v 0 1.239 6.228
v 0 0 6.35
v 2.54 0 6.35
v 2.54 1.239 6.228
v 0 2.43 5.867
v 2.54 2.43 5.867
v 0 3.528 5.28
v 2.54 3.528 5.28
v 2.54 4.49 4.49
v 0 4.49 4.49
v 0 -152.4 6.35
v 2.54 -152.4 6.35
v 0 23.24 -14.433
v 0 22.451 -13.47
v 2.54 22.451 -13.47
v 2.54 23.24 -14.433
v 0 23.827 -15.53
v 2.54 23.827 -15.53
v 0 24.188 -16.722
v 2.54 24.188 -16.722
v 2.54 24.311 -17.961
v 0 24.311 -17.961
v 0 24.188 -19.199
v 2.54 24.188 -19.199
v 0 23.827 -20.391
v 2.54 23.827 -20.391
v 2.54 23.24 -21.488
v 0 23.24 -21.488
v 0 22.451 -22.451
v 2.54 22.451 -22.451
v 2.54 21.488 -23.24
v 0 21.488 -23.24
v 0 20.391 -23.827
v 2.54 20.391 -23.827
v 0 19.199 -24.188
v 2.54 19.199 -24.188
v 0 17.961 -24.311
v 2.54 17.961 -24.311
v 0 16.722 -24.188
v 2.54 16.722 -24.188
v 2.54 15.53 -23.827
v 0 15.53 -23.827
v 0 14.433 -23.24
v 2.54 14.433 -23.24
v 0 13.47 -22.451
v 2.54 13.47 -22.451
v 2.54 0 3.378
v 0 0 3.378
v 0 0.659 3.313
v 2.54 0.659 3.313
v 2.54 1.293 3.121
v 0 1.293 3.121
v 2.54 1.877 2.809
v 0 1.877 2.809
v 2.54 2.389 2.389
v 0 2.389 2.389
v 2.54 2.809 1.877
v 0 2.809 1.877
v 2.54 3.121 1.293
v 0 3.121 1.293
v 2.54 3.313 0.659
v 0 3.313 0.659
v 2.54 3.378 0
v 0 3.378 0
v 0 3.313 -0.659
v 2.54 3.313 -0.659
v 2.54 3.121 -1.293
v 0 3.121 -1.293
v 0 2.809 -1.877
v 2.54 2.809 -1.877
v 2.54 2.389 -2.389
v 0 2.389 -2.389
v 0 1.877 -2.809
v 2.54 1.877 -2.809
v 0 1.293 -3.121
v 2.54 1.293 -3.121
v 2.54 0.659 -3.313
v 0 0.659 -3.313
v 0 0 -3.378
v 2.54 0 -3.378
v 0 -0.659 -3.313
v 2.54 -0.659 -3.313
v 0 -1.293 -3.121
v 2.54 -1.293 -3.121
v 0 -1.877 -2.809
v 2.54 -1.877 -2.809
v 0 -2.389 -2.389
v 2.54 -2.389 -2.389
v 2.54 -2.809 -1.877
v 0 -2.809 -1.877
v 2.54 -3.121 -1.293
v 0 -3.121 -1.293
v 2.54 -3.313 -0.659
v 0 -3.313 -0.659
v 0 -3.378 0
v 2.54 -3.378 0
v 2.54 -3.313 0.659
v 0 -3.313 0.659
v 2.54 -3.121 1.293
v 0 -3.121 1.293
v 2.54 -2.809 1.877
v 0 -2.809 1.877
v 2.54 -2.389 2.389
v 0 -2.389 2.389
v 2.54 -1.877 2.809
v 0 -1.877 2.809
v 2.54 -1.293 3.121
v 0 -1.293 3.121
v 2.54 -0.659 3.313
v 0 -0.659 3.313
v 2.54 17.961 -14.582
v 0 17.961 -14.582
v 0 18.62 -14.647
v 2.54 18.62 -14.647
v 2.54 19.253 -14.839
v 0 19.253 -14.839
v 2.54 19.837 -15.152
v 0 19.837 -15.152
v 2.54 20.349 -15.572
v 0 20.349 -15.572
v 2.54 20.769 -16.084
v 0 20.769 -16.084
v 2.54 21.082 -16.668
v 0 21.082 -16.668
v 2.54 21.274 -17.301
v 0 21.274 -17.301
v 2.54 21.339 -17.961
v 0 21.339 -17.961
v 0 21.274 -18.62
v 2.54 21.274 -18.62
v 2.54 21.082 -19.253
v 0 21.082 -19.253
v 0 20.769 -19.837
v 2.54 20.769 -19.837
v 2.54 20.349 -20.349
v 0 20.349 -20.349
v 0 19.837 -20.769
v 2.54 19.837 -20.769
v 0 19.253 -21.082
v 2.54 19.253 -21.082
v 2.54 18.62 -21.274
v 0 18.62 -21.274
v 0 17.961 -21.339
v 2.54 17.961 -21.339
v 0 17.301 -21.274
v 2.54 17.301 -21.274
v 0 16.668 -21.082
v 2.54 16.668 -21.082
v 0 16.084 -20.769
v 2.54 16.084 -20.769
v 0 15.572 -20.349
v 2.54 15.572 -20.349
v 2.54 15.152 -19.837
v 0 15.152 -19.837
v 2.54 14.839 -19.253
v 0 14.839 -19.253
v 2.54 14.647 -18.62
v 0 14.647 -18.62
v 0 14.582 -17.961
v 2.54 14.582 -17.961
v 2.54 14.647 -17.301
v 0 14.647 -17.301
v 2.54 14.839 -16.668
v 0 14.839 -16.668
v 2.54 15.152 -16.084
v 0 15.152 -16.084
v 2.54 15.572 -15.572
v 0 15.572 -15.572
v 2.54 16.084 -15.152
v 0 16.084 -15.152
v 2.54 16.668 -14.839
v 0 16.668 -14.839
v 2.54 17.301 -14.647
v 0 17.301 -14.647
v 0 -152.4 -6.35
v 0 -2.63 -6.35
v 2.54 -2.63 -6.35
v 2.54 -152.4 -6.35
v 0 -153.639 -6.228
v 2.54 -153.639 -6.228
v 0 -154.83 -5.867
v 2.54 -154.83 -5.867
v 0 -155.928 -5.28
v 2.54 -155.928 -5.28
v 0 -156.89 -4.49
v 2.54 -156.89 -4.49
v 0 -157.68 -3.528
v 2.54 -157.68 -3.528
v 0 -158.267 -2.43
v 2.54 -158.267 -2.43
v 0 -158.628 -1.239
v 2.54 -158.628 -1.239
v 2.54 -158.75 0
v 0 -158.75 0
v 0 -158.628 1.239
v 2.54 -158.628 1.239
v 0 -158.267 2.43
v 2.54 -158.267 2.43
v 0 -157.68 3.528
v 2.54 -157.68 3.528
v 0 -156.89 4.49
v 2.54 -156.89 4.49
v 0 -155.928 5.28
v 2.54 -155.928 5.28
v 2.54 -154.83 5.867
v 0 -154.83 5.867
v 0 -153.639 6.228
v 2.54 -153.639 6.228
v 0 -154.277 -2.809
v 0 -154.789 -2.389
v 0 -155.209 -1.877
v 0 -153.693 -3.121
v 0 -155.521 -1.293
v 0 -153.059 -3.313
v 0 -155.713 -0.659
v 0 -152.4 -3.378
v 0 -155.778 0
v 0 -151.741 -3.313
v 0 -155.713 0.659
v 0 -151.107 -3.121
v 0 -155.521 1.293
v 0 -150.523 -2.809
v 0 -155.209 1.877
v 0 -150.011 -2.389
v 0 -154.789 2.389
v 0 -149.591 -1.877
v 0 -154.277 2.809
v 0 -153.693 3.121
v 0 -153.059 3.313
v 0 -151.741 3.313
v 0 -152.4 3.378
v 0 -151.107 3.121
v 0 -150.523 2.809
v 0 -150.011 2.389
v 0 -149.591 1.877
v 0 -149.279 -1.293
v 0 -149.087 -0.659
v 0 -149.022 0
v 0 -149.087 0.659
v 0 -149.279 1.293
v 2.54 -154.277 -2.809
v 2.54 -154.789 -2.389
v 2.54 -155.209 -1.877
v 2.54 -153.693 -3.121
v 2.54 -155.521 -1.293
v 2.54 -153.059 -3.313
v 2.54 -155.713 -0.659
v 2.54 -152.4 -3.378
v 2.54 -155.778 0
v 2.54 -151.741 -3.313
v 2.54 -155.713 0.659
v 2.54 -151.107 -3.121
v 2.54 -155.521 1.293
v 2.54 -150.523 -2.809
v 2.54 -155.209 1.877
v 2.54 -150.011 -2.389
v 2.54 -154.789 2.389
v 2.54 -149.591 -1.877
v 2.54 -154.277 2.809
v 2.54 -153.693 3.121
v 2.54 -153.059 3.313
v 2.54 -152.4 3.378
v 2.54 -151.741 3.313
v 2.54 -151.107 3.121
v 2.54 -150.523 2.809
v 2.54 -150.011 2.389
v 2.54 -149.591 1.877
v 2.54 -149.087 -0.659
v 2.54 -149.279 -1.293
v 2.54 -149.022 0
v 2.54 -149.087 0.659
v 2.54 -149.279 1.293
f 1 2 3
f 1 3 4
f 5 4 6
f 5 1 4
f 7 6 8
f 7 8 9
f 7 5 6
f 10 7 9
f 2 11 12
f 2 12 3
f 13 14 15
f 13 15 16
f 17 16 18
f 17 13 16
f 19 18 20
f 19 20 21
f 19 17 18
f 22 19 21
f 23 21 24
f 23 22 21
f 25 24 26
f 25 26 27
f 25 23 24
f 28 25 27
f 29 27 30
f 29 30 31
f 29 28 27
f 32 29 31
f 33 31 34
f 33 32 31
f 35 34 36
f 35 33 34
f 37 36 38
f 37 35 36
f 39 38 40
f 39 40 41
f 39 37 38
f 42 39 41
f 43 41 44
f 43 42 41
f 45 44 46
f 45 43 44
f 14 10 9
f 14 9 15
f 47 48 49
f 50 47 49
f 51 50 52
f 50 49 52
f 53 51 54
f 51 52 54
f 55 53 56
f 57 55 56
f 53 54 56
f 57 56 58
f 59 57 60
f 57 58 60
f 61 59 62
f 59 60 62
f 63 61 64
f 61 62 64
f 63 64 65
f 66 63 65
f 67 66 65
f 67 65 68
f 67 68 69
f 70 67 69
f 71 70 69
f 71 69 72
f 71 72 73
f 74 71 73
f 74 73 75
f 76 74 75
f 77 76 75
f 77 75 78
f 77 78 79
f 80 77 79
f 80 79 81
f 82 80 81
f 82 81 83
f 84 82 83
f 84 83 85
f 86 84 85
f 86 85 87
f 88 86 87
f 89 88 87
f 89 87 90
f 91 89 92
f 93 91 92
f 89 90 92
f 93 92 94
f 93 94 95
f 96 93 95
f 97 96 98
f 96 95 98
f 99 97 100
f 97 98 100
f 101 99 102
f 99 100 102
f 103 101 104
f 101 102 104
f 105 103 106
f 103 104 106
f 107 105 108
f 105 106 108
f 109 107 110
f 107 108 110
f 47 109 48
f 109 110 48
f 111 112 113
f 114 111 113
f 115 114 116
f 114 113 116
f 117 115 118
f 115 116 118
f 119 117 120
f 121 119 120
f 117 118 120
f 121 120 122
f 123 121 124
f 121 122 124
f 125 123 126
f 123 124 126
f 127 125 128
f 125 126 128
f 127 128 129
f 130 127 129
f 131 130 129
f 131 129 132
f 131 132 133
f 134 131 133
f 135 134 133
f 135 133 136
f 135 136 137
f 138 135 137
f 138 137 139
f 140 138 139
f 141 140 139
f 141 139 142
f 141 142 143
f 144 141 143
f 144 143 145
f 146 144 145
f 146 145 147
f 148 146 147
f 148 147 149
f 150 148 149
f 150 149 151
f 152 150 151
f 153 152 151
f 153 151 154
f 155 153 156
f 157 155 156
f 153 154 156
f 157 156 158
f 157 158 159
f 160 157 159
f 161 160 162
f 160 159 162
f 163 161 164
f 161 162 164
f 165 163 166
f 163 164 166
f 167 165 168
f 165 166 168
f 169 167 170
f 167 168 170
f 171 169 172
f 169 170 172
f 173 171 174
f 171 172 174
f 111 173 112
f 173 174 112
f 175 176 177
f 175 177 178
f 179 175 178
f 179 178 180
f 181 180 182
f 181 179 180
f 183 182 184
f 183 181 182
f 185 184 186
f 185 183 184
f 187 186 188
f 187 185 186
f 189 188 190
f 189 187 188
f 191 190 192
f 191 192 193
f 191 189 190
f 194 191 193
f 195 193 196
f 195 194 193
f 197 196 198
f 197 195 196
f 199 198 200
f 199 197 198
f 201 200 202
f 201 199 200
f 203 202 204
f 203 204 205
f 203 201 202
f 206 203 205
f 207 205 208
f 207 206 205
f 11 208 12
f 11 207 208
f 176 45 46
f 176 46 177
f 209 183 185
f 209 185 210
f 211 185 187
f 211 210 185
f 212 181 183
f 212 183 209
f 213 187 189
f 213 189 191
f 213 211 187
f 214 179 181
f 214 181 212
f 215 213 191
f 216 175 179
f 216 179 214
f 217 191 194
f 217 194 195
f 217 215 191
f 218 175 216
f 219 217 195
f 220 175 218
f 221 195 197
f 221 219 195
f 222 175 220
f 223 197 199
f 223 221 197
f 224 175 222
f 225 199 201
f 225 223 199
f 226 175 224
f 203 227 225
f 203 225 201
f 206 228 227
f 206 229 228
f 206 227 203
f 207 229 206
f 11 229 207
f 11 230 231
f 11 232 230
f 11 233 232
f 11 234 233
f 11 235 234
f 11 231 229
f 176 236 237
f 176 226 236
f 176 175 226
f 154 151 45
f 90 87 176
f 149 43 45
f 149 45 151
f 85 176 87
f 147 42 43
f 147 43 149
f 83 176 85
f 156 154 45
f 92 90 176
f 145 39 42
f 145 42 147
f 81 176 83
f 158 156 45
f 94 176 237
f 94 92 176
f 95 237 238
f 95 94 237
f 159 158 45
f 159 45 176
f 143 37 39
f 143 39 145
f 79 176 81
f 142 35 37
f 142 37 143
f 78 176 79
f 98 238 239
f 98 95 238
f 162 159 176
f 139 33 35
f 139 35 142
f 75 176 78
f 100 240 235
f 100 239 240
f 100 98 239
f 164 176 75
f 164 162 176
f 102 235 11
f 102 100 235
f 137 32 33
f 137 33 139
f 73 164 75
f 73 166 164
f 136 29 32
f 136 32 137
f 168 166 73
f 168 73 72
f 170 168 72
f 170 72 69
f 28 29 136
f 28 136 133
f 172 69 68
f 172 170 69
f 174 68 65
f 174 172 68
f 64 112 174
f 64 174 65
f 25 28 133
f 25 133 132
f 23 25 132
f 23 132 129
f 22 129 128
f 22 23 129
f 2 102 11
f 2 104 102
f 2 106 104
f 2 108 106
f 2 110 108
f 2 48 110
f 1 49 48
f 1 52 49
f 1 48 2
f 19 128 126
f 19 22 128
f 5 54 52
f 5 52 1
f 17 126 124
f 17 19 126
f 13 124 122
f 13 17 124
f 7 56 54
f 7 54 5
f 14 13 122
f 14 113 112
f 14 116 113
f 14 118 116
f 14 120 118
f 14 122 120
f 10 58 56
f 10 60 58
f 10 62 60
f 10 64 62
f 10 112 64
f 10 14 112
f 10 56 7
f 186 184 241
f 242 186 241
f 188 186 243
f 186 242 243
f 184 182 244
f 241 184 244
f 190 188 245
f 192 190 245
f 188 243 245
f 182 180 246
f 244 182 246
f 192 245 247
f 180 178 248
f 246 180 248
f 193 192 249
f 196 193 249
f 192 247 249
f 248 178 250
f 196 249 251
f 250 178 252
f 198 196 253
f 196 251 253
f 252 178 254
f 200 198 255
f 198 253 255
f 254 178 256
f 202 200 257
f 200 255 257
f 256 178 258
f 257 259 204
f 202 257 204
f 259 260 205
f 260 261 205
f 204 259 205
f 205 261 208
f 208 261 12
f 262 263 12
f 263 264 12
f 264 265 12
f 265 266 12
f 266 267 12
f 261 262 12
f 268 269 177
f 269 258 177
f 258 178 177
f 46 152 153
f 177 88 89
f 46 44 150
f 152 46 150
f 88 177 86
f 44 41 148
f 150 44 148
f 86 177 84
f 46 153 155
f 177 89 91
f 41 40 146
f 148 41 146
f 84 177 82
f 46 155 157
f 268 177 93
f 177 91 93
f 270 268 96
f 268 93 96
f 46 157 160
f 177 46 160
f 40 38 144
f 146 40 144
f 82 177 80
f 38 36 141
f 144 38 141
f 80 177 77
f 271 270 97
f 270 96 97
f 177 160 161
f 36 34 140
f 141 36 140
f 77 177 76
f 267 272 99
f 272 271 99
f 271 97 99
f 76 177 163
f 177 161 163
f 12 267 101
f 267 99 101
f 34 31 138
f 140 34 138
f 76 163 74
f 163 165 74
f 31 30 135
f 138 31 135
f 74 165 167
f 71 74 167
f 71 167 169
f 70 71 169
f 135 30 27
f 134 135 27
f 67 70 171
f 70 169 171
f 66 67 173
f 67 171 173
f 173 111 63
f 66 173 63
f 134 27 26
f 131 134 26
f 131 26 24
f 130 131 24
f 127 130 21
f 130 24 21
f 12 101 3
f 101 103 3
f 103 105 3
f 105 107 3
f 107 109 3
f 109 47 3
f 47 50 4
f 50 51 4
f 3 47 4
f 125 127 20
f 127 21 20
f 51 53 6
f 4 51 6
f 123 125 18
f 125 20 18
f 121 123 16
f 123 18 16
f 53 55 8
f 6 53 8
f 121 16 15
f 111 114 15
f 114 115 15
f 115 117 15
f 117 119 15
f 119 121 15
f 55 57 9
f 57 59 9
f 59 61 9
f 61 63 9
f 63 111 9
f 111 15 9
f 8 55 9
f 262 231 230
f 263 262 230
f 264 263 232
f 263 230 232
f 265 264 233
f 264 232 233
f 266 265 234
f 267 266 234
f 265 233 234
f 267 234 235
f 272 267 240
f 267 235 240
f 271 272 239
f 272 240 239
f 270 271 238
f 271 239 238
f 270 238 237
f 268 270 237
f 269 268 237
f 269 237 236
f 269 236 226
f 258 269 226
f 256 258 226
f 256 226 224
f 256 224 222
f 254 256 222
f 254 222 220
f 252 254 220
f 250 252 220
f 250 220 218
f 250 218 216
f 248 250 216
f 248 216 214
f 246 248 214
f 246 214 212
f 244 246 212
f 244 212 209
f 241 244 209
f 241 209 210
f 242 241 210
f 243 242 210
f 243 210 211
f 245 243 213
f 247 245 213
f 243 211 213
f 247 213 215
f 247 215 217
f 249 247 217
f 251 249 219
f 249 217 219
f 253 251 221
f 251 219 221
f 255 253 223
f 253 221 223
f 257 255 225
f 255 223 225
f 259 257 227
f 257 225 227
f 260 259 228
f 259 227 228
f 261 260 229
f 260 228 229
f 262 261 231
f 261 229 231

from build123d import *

# Parameters (mm, degrees)
BOSS_EXTRUDE1_DEPTH         = 2.54
F_1_4_CLEARANCE_HOLE2_D     = 6.7564
F_1_4_CLEARANCE_HOLE2_DEPTH = 8.382
F_1_4_CLEARANCE_HOLE2_TIP   = 2.029827343


with BuildPart() as part:
    # Sketch1 → Boss-Extrude1 (new body)
    with BuildSketch(Plane(origin=(0, 0, 0), x_dir=(0, 0, -1), z_dir=(1, 0, 0))):
        with BuildLine():
            Line((6.35, -2.630256121), (6.35, -152.4))
            ThreePointArc((6.35, -152.4), (0, -158.75), (-6.35, -152.4))
            Line((-6.35, -152.4), (-6.35, 0))
            ThreePointArc((-6.35, 0), (-5.866635031, 2.430039796), (-4.490128061, 4.490128061))
            Line((-4.490128061, 4.490128061), (13.470384182, 22.450640303))
            ThreePointArc((13.470384182, 22.450640303), (22.450640303, 22.450640303), (22.450640303, 13.470384182))
            Line((22.450640303, 13.470384182), (6.35, -2.630256121))
        make_face()
    extrude(amount=BOSS_EXTRUDE1_DEPTH)

    # 1/4 Clearance Hole2
    with Locations(Plane(origin=(2.54, 0, 0), x_dir=(0, 0, -1), z_dir=(1, 0, 0))):
        with Locations((0, 0), (0, -152.4), (17.960512242, 17.960512242)):
            Hole(F_1_4_CLEARANCE_HOLE2_D / 2, depth=F_1_4_CLEARANCE_HOLE2_DEPTH)
            with Locations((0, 0, -(F_1_4_CLEARANCE_HOLE2_DEPTH + F_1_4_CLEARANCE_HOLE2_TIP / 2))):  # 118° drill point
                Cone(0, F_1_4_CLEARANCE_HOLE2_D / 2, F_1_4_CLEARANCE_HOLE2_TIP, mode=Mode.SUBTRACT)


solid = part.part
